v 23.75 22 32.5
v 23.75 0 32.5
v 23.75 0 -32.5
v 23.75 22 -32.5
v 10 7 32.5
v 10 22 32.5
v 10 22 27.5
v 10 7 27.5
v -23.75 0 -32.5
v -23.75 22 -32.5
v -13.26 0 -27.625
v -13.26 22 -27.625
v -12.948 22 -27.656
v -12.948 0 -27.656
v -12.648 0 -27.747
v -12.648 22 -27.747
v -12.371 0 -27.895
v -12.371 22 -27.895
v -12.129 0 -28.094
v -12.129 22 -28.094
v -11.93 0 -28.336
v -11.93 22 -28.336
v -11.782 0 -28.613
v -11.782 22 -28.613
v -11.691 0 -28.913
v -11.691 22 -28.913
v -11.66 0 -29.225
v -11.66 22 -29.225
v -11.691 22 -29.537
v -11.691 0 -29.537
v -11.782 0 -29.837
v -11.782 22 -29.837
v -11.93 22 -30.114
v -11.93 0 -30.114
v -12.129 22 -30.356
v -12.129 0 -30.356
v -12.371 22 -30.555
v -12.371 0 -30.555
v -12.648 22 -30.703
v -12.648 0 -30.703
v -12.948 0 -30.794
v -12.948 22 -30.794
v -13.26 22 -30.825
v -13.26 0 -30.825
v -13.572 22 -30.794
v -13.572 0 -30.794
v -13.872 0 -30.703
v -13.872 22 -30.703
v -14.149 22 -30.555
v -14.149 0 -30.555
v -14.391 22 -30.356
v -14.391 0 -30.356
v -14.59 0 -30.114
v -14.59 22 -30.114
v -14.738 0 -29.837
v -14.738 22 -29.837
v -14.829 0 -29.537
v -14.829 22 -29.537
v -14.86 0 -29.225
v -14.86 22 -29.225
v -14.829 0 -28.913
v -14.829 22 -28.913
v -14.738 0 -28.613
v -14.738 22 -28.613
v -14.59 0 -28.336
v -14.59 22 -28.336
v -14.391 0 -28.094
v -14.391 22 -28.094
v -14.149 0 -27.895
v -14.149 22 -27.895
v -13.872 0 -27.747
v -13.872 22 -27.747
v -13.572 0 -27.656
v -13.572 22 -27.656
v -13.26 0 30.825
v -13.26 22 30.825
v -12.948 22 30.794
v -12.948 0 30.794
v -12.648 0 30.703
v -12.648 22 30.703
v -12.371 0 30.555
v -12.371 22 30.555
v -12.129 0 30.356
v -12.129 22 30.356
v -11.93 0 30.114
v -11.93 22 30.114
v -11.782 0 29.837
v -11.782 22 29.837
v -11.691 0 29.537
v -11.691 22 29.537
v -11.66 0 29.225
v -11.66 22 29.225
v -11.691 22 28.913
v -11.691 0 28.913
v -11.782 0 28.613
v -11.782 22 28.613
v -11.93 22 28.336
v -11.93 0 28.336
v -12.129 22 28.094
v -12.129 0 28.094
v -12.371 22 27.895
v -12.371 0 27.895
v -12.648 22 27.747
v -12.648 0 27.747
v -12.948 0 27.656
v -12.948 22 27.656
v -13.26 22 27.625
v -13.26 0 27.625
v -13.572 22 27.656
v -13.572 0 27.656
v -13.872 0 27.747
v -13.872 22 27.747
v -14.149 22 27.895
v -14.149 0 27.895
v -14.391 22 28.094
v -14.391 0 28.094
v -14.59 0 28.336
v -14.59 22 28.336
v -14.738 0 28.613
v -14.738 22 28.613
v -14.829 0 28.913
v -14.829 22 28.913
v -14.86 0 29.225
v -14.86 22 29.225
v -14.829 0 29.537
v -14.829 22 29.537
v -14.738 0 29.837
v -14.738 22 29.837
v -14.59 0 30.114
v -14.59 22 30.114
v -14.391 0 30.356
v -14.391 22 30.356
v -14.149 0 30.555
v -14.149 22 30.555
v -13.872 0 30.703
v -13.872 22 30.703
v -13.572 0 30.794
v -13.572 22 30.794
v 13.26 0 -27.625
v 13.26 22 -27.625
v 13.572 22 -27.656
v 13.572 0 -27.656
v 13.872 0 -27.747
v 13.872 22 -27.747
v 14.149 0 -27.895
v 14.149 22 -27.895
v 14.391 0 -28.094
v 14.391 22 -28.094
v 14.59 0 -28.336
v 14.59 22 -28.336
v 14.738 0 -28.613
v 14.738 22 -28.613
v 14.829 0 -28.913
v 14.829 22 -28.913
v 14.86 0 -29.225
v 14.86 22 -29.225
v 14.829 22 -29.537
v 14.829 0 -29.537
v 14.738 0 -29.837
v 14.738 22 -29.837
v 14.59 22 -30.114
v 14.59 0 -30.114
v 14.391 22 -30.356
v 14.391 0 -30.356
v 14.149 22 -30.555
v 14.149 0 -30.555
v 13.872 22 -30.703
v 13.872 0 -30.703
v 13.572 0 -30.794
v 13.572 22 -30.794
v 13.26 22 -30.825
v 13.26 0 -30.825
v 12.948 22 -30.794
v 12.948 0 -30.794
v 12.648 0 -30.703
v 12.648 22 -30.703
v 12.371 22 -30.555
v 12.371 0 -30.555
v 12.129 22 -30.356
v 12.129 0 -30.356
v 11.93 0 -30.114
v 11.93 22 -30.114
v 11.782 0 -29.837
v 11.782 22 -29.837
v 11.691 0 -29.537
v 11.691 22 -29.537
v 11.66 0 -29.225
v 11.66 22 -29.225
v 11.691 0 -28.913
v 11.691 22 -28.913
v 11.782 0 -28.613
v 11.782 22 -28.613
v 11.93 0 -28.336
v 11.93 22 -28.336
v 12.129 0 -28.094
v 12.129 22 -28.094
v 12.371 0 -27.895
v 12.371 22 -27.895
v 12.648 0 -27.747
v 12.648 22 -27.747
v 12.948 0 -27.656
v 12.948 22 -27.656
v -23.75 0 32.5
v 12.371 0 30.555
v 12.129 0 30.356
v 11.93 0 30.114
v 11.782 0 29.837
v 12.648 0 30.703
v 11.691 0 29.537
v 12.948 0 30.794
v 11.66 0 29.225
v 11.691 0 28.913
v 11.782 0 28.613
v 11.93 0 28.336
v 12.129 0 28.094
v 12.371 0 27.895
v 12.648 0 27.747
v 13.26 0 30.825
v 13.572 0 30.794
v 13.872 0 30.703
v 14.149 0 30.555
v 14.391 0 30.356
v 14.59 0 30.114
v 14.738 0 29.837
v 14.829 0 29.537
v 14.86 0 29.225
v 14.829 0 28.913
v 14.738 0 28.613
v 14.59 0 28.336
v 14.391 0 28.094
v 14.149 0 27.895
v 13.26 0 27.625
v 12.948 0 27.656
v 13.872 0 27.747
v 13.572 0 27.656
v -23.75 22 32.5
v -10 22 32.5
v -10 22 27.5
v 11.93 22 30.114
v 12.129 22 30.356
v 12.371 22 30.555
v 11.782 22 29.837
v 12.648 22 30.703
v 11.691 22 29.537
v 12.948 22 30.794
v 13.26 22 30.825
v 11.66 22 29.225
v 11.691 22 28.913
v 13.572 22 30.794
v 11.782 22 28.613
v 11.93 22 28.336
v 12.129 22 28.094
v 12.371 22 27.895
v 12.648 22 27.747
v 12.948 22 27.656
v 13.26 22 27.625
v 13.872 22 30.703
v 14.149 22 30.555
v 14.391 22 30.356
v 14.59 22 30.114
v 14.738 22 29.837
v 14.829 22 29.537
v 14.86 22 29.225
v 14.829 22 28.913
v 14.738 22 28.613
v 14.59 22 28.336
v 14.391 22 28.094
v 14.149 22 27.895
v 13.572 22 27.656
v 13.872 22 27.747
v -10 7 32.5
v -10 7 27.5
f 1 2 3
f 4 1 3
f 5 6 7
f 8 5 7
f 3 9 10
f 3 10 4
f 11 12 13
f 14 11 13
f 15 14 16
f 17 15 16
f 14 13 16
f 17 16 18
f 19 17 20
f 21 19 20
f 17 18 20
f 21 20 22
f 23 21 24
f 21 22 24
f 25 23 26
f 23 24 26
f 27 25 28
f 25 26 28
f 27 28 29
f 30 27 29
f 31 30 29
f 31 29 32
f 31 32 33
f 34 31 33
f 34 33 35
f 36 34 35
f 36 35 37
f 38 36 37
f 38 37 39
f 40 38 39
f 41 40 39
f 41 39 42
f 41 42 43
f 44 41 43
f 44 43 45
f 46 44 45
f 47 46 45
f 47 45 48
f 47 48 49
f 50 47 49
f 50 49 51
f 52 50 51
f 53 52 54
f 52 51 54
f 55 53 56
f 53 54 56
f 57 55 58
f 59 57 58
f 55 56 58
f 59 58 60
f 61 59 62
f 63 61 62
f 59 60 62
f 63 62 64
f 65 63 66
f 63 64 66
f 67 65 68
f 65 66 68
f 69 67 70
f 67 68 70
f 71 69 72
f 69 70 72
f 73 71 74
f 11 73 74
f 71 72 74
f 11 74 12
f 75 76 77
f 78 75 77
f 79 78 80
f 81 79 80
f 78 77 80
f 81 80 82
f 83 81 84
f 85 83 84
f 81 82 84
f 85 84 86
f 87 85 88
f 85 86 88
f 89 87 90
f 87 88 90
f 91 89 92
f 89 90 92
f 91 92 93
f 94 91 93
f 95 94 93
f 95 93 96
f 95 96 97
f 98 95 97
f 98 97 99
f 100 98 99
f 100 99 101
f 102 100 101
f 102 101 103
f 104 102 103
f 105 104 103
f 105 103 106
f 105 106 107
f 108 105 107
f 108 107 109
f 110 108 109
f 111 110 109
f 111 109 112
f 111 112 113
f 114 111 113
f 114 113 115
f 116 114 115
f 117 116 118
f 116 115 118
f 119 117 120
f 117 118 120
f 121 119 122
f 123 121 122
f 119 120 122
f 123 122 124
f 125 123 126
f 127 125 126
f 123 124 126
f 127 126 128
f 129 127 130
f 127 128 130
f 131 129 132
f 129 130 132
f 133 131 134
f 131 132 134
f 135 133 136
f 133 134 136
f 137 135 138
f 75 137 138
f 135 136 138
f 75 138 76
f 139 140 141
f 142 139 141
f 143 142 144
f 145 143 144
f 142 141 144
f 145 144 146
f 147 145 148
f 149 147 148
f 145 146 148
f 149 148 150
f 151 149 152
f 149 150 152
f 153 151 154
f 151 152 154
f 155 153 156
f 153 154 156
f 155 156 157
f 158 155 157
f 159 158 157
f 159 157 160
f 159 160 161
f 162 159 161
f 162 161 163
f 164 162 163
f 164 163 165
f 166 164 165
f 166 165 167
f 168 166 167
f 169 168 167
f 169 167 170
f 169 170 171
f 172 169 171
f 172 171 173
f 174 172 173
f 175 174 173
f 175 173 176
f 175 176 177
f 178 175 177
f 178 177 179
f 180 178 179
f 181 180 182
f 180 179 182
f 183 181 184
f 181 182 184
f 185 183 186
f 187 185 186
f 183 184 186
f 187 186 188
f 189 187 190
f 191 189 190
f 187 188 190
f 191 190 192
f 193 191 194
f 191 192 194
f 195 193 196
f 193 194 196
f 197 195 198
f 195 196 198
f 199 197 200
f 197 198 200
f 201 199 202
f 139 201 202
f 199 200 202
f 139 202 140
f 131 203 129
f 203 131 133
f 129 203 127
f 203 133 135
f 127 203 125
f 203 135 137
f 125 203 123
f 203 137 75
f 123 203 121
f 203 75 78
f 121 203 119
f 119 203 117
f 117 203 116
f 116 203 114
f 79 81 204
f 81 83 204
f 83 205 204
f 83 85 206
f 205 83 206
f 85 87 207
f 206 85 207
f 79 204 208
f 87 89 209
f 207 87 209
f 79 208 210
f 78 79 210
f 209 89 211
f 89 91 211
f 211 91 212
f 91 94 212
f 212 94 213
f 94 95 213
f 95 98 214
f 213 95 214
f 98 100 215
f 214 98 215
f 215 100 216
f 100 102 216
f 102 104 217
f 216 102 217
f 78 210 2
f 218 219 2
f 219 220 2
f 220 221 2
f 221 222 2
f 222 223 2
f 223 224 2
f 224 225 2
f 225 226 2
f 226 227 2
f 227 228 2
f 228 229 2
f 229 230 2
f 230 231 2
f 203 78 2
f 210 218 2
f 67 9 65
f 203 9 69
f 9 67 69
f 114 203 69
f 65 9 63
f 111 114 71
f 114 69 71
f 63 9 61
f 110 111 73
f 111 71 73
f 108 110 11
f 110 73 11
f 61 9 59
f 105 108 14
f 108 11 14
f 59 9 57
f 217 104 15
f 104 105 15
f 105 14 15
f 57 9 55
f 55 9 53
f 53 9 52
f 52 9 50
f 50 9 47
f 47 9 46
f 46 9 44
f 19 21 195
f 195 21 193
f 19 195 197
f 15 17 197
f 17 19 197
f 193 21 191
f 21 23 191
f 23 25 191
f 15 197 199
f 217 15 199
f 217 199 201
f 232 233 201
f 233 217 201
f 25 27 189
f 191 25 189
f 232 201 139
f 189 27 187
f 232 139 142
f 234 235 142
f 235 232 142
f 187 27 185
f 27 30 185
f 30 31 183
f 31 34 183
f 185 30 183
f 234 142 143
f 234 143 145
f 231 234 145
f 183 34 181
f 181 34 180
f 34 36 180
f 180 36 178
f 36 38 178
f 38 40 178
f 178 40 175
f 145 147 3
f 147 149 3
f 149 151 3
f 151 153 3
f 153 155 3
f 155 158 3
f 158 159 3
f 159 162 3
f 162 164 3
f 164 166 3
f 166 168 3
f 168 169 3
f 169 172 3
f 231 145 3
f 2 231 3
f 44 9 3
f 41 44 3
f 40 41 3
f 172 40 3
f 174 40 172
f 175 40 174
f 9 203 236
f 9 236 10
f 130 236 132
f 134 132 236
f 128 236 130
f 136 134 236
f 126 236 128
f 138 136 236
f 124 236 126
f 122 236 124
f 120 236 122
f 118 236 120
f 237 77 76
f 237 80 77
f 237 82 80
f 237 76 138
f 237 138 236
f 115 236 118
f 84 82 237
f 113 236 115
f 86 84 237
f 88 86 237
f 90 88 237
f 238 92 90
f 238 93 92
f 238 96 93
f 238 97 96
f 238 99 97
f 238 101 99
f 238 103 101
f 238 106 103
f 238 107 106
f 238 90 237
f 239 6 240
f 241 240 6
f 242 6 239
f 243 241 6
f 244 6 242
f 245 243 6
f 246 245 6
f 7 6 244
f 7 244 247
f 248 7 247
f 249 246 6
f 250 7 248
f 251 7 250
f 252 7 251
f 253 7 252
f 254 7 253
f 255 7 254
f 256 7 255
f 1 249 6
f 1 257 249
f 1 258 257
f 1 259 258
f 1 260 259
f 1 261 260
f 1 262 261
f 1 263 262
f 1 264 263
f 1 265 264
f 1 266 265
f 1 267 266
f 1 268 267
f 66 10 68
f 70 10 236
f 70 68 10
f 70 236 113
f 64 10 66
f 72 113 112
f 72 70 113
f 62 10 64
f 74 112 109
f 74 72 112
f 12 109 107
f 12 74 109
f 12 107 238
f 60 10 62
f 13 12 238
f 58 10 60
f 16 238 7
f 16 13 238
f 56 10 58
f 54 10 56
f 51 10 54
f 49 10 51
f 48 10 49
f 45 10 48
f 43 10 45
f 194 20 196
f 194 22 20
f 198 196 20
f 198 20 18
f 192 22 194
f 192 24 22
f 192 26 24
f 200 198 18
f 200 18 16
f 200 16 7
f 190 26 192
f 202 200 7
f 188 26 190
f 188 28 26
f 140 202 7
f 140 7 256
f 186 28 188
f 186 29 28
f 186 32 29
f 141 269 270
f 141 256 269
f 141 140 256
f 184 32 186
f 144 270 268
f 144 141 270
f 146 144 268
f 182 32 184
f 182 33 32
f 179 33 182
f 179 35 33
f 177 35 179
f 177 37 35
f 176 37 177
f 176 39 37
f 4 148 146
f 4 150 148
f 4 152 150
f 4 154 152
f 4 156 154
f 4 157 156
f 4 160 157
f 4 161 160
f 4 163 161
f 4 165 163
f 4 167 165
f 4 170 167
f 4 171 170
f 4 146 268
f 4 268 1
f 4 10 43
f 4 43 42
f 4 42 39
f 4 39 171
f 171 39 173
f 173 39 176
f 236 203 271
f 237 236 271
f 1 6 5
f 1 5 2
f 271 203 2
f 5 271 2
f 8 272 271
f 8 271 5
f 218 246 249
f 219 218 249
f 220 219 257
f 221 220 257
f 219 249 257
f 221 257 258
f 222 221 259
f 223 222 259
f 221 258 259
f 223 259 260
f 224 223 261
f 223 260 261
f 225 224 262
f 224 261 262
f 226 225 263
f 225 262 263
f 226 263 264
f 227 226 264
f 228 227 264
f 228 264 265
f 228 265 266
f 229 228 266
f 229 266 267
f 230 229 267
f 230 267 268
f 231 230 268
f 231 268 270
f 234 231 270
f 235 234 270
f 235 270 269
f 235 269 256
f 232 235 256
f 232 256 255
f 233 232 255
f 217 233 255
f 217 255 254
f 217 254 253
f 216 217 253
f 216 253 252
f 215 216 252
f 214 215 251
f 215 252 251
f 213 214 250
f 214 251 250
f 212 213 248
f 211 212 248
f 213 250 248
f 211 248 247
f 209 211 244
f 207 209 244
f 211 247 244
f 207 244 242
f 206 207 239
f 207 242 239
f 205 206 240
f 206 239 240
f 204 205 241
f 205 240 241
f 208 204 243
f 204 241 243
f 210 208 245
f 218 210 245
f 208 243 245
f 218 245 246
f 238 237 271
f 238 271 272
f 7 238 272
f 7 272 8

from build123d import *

# Parameters (mm, degrees)
SKETCH1_W           = 47.5
SKETCH1_H           = 65
BOSS_EXTRUDE1_DEPTH = 22
SKETCH2_R           = 1.6
CUT_EXTRUDE1_DEPTH  = 46.87278605
SKETCH4_W           = 20
SKETCH4_H           = 5
CUT_EXTRUDE2_DEPTH  = 15


with BuildPart() as part:
    # Sketch1 → Boss-Extrude1 (new body)
    with BuildSketch(Plane(origin=(0, 0, 0), x_dir=(1, 0, 0), z_dir=(0, 1, 0))):
        Rectangle(SKETCH1_W, SKETCH1_H)
    extrude(amount=BOSS_EXTRUDE1_DEPTH)

    # Sketch2 → Cut-Extrude1 (cut, through all)
    with BuildSketch(Plane(origin=(0, 22, 0), x_dir=(1, 0, 0), z_dir=(0, 1, 0))):
        with Locations(Location((-13.26, 29.225, 0), (0, 0, 270))):
            Circle(SKETCH2_R)
        with Locations(Location((13.26, 29.225, 0), (0, 0, 270))):
            Circle(SKETCH2_R)
        with Locations(Location((13.26, -29.225, 0), (0, 0, 270))):
            Circle(SKETCH2_R)
        with Locations(Location((-13.26, -29.225, 0), (0, 0, 270))):
            Circle(SKETCH2_R)
    extrude(amount=-CUT_EXTRUDE1_DEPTH, mode=Mode.SUBTRACT)

    # Sketch4 → Cut-Extrude2 (cut)
    with BuildSketch(Plane(origin=(0, 22, 0), x_dir=(1, 0, 0), z_dir=(0, 1, 0))):
        with Locations((0, -30)):
            Rectangle(SKETCH4_W, SKETCH4_H)
    extrude(amount=-CUT_EXTRUDE2_DEPTH, mode=Mode.SUBTRACT)


solid = part.part
